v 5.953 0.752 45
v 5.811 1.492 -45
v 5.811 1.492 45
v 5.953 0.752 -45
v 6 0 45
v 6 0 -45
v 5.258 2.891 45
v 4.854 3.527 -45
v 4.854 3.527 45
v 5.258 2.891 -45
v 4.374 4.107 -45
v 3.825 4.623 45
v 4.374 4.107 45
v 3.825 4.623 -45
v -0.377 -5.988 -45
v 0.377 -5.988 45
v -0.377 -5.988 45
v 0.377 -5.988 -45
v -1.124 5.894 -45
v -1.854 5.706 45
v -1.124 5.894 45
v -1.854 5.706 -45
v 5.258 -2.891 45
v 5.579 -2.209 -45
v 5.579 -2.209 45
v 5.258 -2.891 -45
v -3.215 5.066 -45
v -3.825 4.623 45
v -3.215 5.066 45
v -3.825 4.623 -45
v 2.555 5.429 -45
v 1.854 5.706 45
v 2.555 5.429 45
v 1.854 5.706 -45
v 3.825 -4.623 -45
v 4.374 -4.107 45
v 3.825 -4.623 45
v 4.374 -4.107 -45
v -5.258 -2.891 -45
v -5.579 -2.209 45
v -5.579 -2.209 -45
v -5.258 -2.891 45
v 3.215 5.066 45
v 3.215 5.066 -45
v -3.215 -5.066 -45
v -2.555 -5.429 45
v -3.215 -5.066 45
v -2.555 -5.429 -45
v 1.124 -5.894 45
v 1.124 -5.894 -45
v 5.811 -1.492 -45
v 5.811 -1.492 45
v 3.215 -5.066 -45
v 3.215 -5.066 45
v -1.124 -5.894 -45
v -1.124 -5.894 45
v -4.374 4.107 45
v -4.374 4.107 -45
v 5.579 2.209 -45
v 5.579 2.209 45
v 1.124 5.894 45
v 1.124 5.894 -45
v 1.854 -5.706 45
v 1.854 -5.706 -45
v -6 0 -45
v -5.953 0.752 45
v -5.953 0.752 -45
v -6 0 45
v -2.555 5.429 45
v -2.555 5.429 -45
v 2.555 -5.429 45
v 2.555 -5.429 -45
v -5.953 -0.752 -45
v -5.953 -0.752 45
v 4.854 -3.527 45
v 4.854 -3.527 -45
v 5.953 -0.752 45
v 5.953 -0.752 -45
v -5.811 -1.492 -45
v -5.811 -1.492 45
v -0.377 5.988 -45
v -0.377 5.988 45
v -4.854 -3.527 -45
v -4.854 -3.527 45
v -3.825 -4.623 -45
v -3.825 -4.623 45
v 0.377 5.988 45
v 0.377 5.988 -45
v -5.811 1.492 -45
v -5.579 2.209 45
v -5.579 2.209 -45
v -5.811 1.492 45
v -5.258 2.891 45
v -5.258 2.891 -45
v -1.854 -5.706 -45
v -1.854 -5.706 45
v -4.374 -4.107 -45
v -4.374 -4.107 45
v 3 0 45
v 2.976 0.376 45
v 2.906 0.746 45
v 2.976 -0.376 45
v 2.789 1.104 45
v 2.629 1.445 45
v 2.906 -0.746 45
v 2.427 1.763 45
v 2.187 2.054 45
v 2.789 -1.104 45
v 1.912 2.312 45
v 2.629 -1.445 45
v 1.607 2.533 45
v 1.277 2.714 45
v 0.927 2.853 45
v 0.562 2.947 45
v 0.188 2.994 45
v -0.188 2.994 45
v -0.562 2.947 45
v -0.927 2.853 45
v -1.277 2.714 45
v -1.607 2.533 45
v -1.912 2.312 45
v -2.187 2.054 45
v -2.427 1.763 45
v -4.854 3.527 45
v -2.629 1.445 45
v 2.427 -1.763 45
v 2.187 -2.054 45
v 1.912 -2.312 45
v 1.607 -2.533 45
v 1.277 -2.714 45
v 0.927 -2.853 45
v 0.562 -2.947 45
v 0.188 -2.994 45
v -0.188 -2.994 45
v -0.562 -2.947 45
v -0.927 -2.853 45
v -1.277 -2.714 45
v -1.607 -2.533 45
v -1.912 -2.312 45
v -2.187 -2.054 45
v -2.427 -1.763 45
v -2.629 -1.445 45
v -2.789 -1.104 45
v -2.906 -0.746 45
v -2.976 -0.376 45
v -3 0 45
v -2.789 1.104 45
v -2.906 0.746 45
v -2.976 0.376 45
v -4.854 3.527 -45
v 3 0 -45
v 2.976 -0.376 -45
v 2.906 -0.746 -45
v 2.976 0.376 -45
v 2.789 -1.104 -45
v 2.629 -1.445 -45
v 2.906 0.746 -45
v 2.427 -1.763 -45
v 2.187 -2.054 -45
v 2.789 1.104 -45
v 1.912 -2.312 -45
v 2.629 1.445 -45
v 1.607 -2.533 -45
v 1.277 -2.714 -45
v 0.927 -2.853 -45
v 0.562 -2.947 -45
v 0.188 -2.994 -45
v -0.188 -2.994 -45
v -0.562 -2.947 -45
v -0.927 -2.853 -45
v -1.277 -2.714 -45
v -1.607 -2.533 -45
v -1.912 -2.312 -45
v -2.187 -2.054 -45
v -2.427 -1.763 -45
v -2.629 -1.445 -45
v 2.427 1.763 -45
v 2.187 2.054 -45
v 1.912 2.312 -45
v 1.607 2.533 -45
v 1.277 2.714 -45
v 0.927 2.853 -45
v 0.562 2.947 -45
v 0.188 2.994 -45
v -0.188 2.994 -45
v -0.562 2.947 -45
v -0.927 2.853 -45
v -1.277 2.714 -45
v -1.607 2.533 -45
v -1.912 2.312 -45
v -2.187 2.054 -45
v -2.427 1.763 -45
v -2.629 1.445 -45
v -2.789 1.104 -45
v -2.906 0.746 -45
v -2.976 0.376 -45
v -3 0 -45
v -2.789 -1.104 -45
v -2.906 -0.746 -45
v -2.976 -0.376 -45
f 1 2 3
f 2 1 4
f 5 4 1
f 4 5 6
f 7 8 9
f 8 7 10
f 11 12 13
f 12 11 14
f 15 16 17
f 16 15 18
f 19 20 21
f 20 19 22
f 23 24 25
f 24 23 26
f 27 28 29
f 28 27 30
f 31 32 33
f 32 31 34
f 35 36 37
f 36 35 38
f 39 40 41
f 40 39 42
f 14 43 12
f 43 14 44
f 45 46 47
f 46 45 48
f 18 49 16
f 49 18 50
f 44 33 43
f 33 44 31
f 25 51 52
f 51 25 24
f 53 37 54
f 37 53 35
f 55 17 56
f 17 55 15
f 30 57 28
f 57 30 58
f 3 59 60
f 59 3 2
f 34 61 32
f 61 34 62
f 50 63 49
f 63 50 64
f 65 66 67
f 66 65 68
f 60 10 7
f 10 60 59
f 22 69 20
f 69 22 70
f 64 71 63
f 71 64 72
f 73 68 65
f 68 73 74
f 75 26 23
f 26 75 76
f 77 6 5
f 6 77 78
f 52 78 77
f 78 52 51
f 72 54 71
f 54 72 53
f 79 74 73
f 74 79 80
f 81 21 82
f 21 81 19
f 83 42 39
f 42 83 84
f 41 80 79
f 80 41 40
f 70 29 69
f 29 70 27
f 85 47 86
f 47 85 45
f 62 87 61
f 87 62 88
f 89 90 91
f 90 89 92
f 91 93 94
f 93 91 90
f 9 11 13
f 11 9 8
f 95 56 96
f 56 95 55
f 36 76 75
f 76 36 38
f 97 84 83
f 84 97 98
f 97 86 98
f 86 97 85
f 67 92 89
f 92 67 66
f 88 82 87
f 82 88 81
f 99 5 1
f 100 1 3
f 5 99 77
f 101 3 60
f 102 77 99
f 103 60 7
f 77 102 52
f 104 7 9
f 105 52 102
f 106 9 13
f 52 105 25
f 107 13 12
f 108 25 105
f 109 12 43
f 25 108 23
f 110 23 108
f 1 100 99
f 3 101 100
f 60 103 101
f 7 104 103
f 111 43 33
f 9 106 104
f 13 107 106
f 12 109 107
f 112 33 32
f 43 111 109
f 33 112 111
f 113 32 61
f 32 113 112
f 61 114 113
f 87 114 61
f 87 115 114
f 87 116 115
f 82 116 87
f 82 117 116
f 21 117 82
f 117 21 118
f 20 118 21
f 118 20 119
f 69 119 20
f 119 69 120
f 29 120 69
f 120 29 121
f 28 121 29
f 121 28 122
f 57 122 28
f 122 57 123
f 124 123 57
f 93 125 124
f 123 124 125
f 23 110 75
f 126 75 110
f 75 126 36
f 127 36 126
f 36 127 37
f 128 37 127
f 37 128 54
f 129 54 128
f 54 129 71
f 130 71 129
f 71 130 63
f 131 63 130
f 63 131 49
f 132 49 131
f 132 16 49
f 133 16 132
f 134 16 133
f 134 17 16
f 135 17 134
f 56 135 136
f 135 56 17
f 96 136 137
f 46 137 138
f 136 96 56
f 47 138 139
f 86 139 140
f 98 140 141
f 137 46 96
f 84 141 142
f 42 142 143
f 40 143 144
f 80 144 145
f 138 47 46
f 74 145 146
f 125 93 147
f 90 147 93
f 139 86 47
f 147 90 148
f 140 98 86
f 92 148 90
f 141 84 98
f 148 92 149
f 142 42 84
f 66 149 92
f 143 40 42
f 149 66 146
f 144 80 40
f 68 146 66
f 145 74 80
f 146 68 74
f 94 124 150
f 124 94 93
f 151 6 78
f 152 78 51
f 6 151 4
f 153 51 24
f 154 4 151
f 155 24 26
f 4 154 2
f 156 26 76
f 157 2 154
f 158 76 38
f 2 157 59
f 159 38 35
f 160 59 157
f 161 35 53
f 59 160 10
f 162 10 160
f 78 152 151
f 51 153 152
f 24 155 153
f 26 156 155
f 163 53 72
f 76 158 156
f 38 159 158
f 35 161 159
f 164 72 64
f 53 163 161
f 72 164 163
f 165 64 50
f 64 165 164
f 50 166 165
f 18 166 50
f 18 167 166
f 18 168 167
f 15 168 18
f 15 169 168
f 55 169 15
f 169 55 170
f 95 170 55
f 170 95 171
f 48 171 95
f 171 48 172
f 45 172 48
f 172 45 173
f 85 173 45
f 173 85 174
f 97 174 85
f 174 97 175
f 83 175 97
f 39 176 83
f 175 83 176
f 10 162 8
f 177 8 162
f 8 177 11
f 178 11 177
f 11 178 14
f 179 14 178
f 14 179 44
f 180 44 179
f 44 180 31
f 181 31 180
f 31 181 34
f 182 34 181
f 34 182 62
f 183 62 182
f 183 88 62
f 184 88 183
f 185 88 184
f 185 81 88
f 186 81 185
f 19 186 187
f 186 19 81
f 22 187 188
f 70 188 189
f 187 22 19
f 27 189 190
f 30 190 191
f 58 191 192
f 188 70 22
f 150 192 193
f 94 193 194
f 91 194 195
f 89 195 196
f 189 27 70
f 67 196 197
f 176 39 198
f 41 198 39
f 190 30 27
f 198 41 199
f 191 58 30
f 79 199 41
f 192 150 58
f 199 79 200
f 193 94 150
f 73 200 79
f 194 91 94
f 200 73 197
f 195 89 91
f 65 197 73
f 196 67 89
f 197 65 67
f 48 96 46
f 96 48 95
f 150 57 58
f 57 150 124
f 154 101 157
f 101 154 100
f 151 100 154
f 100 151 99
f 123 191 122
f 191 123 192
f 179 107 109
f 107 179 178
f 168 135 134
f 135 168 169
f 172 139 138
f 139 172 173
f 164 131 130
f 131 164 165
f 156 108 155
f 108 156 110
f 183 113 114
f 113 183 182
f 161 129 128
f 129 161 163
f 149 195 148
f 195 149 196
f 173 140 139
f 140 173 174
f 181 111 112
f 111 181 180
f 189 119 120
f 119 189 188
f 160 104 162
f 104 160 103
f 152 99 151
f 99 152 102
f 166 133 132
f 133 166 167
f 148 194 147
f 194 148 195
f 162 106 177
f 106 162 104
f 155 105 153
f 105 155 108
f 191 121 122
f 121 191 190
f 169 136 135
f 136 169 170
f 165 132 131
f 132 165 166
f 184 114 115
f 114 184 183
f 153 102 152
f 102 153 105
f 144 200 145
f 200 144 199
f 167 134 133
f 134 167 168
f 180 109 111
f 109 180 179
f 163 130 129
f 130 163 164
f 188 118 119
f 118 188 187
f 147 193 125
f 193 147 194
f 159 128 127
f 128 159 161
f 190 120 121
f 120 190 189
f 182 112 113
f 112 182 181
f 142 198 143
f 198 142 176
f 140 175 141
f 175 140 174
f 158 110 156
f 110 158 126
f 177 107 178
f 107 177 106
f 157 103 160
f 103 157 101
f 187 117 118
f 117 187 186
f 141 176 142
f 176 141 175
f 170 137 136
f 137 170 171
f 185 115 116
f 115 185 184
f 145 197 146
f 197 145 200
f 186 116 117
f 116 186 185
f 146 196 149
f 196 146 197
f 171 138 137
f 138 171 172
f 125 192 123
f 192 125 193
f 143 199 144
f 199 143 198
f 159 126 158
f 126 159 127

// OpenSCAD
$fn = 50;


difference() {
	union() {
		translate(v = [0, 0, -45.0000000000]) {
			cylinder(h = 90, r = 6.0000000000);
		}
	}
	union() {
		translate(v = [0, 0, -100.0000000000]) {
			cylinder(h = 200, r = 3.0000000000);
		}
	}
}
